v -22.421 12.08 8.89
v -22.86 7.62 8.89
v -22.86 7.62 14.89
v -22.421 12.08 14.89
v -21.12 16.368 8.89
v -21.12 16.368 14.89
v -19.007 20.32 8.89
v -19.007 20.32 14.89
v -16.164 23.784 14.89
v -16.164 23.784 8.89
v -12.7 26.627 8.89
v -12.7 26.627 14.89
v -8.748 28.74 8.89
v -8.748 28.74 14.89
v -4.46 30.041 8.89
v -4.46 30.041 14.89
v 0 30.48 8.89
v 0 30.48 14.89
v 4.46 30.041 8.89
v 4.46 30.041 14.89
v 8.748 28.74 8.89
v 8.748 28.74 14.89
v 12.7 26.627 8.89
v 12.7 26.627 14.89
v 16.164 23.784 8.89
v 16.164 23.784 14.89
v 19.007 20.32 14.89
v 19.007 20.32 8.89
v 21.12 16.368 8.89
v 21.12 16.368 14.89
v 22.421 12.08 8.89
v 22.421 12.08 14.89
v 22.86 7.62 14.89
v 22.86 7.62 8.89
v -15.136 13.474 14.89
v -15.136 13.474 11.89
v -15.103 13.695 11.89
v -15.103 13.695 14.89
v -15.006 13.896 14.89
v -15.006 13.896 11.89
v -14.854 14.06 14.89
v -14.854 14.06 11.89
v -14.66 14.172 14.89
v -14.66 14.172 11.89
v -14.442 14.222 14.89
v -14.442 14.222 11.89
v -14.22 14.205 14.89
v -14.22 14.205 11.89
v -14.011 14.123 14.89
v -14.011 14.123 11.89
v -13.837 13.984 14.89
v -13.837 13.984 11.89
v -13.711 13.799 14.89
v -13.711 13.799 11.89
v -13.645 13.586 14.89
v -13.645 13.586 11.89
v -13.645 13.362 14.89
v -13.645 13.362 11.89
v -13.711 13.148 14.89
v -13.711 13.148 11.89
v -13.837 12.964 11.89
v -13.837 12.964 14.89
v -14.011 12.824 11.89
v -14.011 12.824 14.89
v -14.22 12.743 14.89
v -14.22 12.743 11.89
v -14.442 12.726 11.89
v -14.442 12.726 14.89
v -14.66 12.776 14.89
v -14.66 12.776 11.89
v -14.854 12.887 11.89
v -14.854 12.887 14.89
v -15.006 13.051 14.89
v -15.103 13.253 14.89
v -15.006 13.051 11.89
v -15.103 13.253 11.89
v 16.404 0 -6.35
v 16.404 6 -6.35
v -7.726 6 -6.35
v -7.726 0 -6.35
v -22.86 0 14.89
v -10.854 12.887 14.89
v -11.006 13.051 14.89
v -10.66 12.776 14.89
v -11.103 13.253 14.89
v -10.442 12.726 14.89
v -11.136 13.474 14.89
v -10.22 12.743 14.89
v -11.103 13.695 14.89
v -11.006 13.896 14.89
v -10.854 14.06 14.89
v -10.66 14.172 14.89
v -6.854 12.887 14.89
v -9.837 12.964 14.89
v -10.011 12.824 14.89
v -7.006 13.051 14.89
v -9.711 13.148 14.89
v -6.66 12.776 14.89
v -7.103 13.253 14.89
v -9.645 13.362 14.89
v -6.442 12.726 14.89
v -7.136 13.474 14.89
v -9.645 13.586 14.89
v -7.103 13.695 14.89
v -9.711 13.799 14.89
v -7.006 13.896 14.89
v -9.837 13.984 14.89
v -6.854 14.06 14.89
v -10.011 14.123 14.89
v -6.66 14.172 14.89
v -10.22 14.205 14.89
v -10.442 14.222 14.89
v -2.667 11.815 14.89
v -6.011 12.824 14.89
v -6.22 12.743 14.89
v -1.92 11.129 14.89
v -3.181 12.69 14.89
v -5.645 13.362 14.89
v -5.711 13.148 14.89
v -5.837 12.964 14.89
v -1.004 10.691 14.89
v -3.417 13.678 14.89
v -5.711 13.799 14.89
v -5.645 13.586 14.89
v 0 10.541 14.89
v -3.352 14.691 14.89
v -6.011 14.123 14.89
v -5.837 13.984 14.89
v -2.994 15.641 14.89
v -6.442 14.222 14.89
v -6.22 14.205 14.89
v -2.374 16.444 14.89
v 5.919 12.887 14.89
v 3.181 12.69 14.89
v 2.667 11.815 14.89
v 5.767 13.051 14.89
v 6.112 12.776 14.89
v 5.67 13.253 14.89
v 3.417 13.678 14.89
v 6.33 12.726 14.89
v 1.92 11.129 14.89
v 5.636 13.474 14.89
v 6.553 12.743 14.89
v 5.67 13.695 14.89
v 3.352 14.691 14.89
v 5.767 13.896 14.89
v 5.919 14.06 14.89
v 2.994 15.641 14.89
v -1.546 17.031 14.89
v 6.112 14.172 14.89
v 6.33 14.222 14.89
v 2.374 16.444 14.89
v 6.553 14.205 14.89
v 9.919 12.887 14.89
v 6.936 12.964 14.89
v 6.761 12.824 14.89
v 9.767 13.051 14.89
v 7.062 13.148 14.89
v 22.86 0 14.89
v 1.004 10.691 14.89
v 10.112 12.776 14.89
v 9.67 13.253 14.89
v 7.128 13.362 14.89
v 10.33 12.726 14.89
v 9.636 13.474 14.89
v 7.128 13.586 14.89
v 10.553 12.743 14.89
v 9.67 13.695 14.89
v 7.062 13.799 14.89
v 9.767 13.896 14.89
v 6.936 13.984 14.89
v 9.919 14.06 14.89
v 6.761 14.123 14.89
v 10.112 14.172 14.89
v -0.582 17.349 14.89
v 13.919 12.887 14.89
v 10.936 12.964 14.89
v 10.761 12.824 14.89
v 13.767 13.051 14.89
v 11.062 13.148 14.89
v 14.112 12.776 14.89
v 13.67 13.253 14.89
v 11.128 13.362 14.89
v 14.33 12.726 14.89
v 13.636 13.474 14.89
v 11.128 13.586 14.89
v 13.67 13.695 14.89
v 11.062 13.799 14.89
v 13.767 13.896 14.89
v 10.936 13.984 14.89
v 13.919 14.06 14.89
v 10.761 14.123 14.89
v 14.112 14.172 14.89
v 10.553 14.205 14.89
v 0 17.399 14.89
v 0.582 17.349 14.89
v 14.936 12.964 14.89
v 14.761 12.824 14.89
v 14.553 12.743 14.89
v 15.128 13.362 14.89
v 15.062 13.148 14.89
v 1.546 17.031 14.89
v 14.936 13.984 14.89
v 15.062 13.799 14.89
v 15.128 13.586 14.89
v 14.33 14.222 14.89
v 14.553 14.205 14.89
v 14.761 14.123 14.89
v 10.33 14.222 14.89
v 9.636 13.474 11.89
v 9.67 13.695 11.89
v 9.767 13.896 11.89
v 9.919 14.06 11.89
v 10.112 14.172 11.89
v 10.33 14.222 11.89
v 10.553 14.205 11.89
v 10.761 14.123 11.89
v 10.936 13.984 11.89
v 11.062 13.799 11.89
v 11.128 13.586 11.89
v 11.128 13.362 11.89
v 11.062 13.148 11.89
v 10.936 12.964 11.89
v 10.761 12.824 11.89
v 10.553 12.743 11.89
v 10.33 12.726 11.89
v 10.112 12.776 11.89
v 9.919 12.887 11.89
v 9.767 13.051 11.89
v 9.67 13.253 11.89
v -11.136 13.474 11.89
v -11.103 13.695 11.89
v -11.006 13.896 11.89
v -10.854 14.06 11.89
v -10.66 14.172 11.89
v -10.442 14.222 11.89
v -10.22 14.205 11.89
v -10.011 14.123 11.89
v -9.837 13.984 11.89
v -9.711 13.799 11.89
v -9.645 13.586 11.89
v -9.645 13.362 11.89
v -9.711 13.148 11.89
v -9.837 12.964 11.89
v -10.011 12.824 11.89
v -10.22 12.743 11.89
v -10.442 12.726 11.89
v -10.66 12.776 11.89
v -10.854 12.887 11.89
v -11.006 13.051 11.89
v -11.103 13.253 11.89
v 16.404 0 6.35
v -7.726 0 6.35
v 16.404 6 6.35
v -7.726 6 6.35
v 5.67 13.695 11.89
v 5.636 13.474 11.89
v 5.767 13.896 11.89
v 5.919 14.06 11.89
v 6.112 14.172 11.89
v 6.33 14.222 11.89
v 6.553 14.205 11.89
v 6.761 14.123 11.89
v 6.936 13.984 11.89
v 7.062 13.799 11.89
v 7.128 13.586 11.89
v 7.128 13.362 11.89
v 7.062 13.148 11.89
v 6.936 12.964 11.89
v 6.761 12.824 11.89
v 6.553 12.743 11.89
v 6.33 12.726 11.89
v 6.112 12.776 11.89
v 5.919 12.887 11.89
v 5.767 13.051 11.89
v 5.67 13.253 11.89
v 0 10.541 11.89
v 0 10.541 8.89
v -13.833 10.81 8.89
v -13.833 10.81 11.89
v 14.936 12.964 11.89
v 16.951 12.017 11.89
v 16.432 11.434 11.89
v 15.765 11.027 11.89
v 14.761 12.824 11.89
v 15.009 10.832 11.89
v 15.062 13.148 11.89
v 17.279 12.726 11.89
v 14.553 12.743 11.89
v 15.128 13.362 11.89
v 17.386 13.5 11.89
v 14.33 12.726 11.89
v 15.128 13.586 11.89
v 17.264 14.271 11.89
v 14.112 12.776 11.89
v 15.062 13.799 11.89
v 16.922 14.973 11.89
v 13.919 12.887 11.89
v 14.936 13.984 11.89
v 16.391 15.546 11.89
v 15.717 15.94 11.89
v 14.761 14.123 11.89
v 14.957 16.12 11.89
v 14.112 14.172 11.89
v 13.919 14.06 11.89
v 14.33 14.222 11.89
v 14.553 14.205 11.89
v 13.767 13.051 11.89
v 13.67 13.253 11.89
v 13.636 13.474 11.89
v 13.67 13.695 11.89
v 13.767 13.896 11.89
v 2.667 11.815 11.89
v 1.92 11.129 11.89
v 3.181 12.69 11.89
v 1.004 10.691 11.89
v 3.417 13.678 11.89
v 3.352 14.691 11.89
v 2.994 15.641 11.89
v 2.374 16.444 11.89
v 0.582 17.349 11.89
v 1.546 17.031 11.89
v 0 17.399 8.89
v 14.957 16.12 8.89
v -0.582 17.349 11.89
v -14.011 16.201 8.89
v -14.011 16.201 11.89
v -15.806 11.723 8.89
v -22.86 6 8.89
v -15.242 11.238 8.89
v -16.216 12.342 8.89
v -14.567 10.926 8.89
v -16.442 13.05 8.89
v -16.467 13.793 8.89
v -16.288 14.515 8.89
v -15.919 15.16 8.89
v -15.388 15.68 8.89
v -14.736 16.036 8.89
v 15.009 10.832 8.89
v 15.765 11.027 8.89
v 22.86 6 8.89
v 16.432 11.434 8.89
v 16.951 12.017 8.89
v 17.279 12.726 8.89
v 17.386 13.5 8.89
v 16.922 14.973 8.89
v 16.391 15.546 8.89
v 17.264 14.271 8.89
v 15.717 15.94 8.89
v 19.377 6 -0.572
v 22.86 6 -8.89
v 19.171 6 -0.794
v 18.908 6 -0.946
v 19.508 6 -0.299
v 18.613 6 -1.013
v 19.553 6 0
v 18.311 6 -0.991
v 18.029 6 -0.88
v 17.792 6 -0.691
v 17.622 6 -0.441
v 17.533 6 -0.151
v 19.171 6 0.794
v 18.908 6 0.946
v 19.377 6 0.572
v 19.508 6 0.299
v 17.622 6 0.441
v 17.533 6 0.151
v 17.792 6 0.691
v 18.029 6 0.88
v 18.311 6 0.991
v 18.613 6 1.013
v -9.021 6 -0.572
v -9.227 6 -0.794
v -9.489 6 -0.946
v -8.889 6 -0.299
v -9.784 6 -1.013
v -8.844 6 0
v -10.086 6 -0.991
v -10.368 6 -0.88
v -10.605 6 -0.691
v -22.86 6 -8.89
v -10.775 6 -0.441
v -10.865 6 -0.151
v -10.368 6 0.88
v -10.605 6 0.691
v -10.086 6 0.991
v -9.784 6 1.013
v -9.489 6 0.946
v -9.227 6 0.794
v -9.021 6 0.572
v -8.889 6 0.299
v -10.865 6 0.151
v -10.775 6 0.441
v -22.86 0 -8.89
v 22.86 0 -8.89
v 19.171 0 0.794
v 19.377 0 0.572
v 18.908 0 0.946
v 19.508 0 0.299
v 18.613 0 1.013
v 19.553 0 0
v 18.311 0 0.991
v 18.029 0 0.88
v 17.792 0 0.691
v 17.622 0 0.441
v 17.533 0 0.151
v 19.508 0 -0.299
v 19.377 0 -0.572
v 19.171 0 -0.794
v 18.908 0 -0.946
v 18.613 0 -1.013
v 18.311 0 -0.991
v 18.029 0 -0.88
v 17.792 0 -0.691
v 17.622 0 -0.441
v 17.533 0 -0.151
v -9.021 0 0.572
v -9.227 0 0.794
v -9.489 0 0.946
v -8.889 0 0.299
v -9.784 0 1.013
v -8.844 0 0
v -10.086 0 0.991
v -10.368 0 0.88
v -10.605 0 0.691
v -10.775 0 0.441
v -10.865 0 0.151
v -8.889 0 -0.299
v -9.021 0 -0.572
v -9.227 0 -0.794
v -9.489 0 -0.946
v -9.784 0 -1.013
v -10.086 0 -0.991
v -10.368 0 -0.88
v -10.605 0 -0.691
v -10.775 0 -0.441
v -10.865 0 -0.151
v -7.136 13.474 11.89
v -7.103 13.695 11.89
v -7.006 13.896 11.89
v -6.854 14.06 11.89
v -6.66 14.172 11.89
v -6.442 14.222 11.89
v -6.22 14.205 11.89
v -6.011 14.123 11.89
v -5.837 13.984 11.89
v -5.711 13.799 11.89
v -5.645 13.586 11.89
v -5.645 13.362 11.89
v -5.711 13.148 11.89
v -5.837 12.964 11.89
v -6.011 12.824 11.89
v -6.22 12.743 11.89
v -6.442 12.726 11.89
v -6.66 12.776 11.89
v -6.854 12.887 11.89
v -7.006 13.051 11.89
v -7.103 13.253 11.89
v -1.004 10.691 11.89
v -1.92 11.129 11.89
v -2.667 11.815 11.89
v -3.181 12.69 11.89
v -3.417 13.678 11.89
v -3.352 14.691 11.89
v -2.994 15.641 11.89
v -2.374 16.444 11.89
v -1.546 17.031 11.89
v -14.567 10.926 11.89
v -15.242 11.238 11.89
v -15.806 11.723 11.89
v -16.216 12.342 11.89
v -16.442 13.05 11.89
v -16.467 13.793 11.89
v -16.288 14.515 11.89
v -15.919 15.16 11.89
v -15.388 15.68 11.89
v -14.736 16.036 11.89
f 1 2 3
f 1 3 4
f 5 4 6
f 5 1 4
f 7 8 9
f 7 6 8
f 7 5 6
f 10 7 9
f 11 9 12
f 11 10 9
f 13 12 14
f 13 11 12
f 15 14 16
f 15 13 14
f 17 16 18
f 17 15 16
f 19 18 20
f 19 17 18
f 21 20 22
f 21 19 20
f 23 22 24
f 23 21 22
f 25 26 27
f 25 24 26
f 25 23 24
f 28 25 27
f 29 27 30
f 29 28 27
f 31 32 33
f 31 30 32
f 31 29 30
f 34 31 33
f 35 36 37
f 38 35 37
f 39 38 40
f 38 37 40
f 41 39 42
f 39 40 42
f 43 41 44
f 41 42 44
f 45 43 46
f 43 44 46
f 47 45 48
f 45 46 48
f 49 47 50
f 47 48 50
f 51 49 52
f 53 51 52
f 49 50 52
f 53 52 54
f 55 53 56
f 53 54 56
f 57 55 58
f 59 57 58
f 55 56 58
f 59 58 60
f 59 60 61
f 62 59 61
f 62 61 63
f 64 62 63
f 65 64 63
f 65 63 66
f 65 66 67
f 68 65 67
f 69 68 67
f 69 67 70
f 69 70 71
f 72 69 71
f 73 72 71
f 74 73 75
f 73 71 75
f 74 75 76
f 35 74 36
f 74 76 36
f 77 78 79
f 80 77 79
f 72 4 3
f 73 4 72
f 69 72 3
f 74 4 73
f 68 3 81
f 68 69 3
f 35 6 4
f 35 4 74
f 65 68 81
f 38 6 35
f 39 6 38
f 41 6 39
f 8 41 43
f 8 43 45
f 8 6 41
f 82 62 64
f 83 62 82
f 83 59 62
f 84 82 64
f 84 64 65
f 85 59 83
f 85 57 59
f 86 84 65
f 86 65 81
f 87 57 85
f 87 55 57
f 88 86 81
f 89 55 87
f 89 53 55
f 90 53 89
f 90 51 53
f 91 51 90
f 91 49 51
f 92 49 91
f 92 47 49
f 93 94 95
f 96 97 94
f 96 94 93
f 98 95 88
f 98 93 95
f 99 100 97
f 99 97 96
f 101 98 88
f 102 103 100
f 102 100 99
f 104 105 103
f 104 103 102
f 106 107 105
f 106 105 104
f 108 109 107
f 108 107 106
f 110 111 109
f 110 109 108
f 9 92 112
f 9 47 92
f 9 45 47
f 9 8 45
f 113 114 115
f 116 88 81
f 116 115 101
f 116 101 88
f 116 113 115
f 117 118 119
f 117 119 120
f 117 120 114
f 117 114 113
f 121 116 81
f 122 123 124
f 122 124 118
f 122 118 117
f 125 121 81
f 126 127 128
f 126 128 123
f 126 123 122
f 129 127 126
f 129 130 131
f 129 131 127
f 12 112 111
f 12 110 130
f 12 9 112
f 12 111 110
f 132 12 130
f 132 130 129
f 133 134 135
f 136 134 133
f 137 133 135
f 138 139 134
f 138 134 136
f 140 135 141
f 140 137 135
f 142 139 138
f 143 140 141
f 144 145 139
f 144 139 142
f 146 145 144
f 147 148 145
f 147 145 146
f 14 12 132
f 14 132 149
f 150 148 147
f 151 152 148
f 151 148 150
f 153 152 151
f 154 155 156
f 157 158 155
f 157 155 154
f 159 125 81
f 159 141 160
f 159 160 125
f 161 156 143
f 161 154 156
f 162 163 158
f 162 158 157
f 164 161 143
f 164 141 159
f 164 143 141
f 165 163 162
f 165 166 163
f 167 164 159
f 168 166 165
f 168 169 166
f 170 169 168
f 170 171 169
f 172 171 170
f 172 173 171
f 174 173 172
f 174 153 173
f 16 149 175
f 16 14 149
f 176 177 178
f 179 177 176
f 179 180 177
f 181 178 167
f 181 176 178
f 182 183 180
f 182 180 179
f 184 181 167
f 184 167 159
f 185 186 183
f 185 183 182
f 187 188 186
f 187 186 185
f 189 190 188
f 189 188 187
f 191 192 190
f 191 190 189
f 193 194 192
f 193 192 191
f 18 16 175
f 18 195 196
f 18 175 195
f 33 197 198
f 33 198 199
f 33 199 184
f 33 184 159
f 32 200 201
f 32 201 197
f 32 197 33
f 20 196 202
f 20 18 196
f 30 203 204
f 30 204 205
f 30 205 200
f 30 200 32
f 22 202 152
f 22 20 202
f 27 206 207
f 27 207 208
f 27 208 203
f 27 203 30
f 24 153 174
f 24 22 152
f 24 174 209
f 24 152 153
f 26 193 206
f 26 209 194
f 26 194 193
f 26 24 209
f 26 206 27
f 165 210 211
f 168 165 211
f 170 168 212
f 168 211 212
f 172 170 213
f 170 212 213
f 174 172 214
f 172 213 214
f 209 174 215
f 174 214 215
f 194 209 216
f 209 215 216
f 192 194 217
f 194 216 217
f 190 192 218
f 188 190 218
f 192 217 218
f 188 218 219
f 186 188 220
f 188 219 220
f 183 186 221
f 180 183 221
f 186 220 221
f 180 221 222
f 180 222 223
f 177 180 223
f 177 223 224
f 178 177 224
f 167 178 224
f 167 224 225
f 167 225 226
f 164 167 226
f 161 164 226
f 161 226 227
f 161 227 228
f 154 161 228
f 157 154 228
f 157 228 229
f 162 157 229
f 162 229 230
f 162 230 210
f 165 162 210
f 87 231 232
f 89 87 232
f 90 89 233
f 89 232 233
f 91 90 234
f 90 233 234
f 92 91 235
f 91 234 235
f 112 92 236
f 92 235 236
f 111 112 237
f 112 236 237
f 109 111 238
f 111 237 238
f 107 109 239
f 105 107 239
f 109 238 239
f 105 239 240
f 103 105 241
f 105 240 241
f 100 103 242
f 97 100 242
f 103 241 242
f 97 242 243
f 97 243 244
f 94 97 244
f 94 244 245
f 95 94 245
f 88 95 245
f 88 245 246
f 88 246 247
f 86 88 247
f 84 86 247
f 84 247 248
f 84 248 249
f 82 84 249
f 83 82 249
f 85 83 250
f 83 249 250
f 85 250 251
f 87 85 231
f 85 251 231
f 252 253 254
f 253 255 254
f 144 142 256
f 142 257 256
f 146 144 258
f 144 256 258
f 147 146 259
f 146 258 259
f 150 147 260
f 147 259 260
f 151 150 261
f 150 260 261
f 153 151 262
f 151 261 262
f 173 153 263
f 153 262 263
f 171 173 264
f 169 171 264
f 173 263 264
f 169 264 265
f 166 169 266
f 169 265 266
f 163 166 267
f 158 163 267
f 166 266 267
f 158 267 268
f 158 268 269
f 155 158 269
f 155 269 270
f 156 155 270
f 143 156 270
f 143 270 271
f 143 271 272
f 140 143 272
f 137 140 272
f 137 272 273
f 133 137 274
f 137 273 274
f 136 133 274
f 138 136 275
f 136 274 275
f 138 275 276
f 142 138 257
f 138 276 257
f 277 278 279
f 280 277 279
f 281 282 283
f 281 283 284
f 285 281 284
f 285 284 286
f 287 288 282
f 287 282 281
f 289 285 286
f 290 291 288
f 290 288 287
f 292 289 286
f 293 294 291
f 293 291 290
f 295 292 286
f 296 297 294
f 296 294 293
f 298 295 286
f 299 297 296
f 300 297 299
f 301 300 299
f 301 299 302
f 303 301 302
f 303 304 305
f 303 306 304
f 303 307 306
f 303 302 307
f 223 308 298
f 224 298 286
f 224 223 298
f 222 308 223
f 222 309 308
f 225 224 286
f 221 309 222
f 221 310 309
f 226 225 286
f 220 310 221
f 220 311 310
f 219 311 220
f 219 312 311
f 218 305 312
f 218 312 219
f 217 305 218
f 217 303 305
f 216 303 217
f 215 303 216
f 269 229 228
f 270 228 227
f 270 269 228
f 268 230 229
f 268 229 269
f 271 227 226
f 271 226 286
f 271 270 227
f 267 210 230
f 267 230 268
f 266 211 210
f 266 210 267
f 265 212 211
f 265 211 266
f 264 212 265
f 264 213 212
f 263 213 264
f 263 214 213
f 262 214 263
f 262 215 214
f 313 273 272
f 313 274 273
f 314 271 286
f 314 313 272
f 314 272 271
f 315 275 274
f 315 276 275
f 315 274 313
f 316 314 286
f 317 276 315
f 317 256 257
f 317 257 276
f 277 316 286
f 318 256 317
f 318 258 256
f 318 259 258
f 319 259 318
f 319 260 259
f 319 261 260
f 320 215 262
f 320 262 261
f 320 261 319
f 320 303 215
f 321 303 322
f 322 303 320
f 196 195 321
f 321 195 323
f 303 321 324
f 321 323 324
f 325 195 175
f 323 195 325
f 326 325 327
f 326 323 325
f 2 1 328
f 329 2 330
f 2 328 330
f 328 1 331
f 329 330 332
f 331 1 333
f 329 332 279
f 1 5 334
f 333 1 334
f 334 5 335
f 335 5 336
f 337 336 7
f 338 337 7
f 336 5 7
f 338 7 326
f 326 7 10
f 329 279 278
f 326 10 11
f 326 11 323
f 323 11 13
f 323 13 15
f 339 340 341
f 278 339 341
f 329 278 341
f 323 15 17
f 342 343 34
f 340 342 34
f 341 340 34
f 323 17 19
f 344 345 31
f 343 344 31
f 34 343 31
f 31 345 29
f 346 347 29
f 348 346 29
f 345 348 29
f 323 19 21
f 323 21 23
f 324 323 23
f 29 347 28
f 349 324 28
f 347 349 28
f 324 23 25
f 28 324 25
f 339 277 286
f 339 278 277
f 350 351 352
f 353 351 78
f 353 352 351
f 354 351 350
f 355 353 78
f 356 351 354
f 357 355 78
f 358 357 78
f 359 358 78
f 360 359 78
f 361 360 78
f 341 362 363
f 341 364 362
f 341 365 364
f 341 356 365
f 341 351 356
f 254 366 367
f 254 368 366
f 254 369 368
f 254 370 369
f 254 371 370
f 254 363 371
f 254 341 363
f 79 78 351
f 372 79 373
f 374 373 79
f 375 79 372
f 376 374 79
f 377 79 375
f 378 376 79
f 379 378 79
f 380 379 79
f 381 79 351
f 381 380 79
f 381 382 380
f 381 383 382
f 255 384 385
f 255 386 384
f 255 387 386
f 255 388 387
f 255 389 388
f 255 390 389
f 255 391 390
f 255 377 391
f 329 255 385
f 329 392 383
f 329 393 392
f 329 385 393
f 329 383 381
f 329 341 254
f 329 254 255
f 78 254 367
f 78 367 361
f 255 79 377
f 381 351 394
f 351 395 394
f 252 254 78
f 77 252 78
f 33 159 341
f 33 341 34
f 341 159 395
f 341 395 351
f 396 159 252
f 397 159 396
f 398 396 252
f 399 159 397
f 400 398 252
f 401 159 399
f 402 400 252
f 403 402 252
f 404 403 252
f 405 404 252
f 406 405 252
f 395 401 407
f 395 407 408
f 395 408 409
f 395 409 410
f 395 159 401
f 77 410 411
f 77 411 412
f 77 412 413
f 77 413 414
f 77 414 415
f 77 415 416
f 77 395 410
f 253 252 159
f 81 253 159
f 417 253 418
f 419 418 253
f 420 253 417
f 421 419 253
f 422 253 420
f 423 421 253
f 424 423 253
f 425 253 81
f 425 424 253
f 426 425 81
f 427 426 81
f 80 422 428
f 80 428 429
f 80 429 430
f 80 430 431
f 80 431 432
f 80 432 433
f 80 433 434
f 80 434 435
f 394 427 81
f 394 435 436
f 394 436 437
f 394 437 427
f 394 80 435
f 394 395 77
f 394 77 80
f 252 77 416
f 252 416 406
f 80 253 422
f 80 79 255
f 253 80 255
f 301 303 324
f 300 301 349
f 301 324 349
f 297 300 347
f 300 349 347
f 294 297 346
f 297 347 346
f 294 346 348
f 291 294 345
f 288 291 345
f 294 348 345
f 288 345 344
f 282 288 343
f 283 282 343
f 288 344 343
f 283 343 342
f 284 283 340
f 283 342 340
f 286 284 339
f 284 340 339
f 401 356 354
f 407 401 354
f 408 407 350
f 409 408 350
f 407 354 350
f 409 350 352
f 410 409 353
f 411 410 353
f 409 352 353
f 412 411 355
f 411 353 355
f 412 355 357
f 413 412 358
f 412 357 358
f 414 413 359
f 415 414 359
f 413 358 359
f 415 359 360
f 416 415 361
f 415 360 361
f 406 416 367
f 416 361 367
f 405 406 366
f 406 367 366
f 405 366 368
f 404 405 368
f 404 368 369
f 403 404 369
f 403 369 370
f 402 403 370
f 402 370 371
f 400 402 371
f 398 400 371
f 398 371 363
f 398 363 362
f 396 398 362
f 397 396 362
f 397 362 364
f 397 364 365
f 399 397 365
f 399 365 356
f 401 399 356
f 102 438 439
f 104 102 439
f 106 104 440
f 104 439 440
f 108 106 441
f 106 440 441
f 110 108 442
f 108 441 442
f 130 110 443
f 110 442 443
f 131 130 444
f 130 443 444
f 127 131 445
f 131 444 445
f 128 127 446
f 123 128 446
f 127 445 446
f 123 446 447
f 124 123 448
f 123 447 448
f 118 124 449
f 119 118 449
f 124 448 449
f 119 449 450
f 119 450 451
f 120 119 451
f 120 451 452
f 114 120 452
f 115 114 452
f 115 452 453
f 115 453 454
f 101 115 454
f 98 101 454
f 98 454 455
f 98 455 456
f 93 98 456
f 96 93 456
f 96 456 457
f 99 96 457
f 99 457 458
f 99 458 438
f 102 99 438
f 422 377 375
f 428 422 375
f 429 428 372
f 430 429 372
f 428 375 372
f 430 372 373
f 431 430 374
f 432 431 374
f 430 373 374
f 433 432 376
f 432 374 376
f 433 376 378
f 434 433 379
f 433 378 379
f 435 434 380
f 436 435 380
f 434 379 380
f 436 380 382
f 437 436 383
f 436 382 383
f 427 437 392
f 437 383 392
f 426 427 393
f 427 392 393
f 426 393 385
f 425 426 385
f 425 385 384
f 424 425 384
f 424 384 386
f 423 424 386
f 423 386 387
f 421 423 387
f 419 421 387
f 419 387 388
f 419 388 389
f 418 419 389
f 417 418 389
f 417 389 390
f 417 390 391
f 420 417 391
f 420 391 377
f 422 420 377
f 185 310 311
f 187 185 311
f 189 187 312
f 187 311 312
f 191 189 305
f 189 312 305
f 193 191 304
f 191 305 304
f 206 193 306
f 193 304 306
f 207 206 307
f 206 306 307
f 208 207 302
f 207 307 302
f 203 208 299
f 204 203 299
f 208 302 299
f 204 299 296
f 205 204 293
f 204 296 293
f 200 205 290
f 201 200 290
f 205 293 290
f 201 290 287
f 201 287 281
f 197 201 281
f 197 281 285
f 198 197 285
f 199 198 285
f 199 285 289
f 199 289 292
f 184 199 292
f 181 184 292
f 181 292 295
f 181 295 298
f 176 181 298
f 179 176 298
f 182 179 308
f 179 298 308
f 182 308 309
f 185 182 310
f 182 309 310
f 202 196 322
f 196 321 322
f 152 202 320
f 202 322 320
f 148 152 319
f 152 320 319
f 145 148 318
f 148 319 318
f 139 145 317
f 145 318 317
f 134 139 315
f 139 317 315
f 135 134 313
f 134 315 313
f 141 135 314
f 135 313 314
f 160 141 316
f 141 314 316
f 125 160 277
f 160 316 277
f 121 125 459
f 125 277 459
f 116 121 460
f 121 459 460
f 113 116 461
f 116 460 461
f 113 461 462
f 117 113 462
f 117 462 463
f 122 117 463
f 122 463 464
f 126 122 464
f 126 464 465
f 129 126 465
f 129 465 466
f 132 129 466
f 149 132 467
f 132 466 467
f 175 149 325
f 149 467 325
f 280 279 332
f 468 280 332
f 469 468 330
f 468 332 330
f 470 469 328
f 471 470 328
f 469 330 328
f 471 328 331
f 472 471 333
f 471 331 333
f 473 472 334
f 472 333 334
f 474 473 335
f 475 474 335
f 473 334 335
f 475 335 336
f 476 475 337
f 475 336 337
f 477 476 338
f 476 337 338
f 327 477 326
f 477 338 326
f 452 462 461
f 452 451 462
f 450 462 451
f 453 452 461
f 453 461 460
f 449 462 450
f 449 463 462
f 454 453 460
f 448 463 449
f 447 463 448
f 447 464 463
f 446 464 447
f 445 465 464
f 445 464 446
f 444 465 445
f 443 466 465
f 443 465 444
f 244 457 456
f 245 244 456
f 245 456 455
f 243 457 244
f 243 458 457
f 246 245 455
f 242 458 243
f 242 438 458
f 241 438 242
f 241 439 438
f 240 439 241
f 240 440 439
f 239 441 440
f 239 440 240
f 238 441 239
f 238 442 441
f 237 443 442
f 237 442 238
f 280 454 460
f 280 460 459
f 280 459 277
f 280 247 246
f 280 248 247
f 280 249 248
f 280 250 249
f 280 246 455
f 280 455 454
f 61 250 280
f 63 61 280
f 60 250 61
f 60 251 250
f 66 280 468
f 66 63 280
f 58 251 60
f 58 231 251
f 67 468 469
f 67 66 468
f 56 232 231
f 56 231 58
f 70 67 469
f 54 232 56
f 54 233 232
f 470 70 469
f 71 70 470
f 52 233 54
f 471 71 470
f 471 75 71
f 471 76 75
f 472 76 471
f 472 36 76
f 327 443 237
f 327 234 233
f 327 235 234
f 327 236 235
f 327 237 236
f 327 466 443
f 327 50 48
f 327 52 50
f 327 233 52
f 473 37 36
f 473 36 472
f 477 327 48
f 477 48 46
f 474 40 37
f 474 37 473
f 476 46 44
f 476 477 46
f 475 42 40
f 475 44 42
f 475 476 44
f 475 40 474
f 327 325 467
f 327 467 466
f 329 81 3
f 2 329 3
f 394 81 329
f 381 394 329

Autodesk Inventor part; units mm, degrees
ref_plane "YZ Plane" through (0, 0, 0) normal (1, 0, 0) x (0, 1, 0)
ref_plane "XZ Plane" through (0, 0, 0) normal (0, 1, 0) x (-1, 0, 0)
ref_plane "XY Plane" through (0, 0, 0) normal (0, 0, 1) x (1, 0, 0)
sketch "Sketch1" plane through (0, 0, 0) normal (0, 1, 0) x (-1, 0, 0)
  line L0 (22.86, 8.89) -> (-22.86, 8.89)
  line L1 (-22.86, 8.89) -> (-22.86, -8.89)
  line L2 (-22.86, -8.89) -> (22.86, -8.89)
  line L3 (22.86, -8.89) -> (22.86, 8.89)
  point P0 (0, 0)
  point P1 (0, 0)
  point P2 (0, -8.89)
  point P3 (22.86, 0)
  dimension "d0" = 45.72
  dimension "d1" = 17.78
extrude "Extrusion1" add sketch "Sketch1" along normal blind 6
sketch "Sketch2" plane through (0, 6, 0) normal (0, 1, 0) x (1, 0, 0)
  line L0 (-7.7264, -6.35) -> (16.4036, -6.35)
  line L1 (16.4036, -6.35) -> (16.4036, 6.35)
  line L2 (16.4036, 6.35) -> (-7.7264, 6.35)
  line L3 (-7.7264, 6.35) -> (-7.7264, -6.35)
  circle A0 centre (-9.86, 0) radius 1.016
  circle A1 centre (18.5372, 0) radius 1.016
  line L4 (22.86, -8.89) -> (22.86, 8.89) projected
  line L5 (-22.86, 8.89) -> (-22.86, -8.89) projected
  point P0 (4.3386, 0)
  point P1 (4.3386, 0)
  point P2 (-7.7264, 0)
  point P3 (4.3386, 6.35)
  point P4 (-22.86, 0)
  dimension "d4" = 24.13
  dimension "d5" = 12.7
  dimension "d6" = 2.032
  dimension "d7" = 2.032
  dimension "d8" = 2.1336
  dimension "d9" = 2.1336
  dimension "d31" = 13
extrude "Extrusion2" cut sketch "Sketch2" against normal through all
sketch "Sketch3" plane through (-22.86, 0, 8.89) normal (0, 0, 1) x (1, 0, 0)
  line L0 (45.72, 0) -> (0, 0) projected
  line L1 (0, 0) -> (0, 7.62)
  line L2 (45.72, 0) -> (45.72, 7.62)
  arc A0 (45.72, 7.62) -> (0, 7.62) centre (22.86, 7.62) ccw
  point P0 (22.86, 0)
  dimension "d12" = 7.62
  dimension "d13" = 7.62
extrude "Extrusion3" add sketch "Sketch3" along normal blind 6
sketch "Sketch4" plane through (-22.86, 0, 8.89) normal (0, 0, -1) x (-1, 0, 0)
  arc A0 (0, 7.62) -> (-45.72, 7.62) centre (-22.86, 7.62) ccw projected
  circle A1 centre (-22.86, 13.97) radius 3.429
  line L0 (-22.86, 17.399) -> (-37.8169, 16.12)
  line L1 (-22.86, 10.541) -> (-37.8686, 10.8324)
  arc A2 (-37.8169, 16.12) -> (-37.8686, 10.8324) centre (-37.5906, 13.4738) ccw
  arc A3 (-9.0266, 10.8096) -> (-8.8489, 16.2009) centre (-9.079, 13.5099) ccw
  line L2 (-22.86, 17.399) -> (-8.8489, 16.2009)
  line L3 (-22.86, 10.541) -> (-9.0266, 10.8096)
  point P0 (-22.86, 0)
  point P1 (-22.86, 30.48)
  point P2 (-22.86, 30.48)
  point P3 (-6.3797, 13.421)
  point P4 (-22.86, 30.48)
  point P5 (-23.4422, 17.3492)
  point P6 (-22.9931, 10.5436)
  point P7 (-22.7269, 10.5436)
  point P8 (-22.2778, 17.3492)
  dimension "d24" = 6
  dimension "d25" = 6.858
  dimension "d26" = 6
  dimension "d27" = 13.781
  dimension "d28" = 16.51
extrude "Extrusion4" cut sketch "Sketch4" against normal blind 10 contours A1 L0 L2
extrude "Extrusion6" cut sketch "Sketch4" against normal blind 3 contours L1 A2 L0 A1 | A1 L2 A3 L3
sketch "Sketch5" plane through (-22.86, 0, 8.89) normal (0, 0, -1) x (-1, 0, 0)
  circle A0 centre (-37.2464, 13.4738) radius 0.75
  circle A1 centre (-33.2464, 13.4738) radius 0.75
  circle A2 centre (-29.2464, 13.4738) radius 0.75
  arc A3 (-37.8169, 16.12) -> (-37.8686, 10.8324) centre (-37.5906, 13.4738) ccw projected
  line L0 (-22.86, 20.4173) -> (-22.86, 7.5227)
  arc A4 (-23.4422, 17.3492) -> (-22.9931, 10.5436) centre (-22.86, 13.97) ccw projected
  arc A5 (-22.7269, 10.5436) -> (-22.2778, 17.3492) centre (-22.86, 13.97) ccw projected
  circle A6 centre (-12.4736, 13.4738) radius 0.75
  circle A7 centre (-8.4736, 13.4738) radius 0.75
  circle A8 centre (-16.4736, 13.4738) radius 0.75
  point P0 (-22.86, 0)
  point P1 (-40.2464, 13.4998)
  dimension "d32" = 1.5
  dimension "d36" = 1.5
  dimension "d37" = 1.5
  dimension "d44" = 3
  dimension "d49" = 4
  dimension "d50" = 4
extrude "Extrusion7" cut sketch "Sketch5" against normal through all
properties part number "unions1s2lado2"
